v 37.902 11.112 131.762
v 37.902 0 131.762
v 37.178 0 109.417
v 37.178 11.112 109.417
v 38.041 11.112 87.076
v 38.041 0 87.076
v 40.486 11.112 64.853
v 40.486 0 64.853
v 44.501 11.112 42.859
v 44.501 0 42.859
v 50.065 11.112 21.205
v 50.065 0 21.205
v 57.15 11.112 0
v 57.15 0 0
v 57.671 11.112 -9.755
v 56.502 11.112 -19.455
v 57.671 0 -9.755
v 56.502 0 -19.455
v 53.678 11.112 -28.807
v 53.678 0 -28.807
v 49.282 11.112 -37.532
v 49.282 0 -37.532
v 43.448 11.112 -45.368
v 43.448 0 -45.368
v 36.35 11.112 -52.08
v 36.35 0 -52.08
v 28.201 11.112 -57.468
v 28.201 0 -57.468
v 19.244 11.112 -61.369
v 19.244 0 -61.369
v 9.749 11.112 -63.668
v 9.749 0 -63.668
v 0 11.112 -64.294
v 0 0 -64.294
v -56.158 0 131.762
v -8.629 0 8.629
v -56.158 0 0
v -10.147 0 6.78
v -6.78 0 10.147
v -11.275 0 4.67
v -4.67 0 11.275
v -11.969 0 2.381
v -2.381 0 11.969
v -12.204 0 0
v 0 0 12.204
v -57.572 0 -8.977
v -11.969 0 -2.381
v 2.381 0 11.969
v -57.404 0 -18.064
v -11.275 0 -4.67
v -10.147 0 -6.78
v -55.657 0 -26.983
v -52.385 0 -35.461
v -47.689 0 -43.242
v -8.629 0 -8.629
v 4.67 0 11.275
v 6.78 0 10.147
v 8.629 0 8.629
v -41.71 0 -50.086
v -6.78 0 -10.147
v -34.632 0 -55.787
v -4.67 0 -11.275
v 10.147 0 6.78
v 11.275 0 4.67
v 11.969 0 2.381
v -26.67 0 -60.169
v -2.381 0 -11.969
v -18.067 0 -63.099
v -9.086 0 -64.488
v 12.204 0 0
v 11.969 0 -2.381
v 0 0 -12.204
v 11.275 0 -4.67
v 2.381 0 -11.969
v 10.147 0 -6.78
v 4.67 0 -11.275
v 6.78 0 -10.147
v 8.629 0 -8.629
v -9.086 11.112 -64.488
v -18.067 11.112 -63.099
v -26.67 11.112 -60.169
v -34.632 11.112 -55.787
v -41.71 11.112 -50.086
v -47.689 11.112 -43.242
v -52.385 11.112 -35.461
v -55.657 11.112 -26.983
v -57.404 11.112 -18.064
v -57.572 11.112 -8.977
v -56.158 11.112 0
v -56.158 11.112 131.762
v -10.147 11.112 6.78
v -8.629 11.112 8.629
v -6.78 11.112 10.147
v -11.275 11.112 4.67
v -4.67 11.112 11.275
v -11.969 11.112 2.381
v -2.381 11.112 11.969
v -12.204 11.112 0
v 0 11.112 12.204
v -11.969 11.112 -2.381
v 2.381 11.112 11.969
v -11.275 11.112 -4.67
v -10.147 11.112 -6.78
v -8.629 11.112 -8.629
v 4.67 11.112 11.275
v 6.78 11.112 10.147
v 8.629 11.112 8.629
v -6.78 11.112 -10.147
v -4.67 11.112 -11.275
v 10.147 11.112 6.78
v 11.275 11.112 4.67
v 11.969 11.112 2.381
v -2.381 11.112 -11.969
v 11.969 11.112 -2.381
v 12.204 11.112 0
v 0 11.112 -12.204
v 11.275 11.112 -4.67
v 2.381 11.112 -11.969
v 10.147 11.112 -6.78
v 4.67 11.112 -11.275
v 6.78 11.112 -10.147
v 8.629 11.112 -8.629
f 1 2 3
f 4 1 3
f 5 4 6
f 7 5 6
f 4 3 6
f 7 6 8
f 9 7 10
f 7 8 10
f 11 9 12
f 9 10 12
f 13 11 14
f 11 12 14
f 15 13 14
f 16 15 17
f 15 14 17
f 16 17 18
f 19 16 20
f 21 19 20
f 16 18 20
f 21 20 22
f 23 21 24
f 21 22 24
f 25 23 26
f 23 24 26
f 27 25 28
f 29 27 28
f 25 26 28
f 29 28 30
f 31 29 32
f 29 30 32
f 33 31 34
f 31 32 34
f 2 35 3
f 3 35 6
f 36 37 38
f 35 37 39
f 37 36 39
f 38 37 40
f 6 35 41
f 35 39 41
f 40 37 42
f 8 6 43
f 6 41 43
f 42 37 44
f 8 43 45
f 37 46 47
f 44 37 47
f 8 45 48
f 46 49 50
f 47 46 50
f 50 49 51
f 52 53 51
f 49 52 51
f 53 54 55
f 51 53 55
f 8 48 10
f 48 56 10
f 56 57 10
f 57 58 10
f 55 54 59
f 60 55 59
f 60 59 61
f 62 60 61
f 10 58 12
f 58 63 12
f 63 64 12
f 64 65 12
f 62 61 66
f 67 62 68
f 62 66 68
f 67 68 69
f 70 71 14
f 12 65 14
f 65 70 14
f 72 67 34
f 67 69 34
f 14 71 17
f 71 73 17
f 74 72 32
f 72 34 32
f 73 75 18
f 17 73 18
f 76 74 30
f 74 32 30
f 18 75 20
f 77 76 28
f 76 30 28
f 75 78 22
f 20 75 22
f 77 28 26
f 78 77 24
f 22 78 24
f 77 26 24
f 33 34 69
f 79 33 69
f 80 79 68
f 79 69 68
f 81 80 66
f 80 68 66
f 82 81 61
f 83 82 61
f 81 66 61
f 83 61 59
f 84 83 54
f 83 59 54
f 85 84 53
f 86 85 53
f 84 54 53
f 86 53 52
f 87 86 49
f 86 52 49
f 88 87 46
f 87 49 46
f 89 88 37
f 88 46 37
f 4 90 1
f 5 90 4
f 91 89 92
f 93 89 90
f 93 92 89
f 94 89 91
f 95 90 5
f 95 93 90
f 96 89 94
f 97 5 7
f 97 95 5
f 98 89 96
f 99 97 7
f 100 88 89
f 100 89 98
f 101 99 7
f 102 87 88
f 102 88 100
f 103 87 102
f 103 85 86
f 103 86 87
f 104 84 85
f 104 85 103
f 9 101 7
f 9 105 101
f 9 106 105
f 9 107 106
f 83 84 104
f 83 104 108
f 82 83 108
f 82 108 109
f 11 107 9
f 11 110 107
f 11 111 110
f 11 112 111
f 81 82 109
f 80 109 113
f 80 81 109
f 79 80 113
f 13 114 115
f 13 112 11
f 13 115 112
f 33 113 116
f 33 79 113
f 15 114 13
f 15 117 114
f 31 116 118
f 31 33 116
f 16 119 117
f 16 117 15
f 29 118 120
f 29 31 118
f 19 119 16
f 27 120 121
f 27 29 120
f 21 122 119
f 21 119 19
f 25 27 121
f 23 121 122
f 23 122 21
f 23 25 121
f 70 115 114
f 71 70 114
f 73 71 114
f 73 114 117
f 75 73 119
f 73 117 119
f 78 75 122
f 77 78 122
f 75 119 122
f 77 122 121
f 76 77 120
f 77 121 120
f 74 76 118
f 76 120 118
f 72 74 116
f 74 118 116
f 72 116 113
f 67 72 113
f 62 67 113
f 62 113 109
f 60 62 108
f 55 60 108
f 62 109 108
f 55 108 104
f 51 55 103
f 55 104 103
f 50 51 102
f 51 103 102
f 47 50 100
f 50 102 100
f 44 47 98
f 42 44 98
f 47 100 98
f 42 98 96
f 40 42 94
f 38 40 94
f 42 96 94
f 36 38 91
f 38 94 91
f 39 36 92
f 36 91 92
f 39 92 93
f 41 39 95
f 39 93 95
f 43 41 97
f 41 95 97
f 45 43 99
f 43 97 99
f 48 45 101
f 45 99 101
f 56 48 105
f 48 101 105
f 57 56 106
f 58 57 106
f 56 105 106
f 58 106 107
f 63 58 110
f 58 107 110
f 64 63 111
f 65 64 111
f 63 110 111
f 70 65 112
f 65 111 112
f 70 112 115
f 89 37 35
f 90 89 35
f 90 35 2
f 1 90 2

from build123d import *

# Parameters (mm, degrees)
SKETCH1_R           = 7.9375
BOSS_EXTRUDE1_DEPTH = 11.1125
SKETCH2_R           = 12.20390625
CUT_EXTRUDE1_DEPTH  = 11.1125


with BuildPart() as part:
    # Sketch1 → Boss-Extrude1 (new body)
    with BuildSketch(Plane(origin=(0, 0, 0), x_dir=(1, 0, 0), z_dir=(0, 1, 0))):
        with BuildLine():
            Line((-56.1578125, 0), (-56.1578125, -131.7625))
            Line((-56.1578125, -131.7625), (37.9015625, -131.7625))
            ThreePointArc((37.9015625, -131.7625), (40.48606485, -64.852857695), (57.15, 0))
            ThreePointArc((57.15, 0), (43.44844613, 45.367716005), (0, 64.29375))
            ThreePointArc((0, 64.29375), (-44.848953518, 46.794786657), (-56.1578125, 0))
        make_face()
        Circle(SKETCH1_R, mode=Mode.SUBTRACT)
    extrude(amount=BOSS_EXTRUDE1_DEPTH)

    # Sketch2 → Cut-Extrude1 (cut)
    with BuildSketch(Plane(origin=(0, 11.1125, 0), x_dir=(1, 0, 0), z_dir=(0, 1, 0))):
        Circle(SKETCH2_R)
    extrude(amount=-CUT_EXTRUDE1_DEPTH, mode=Mode.SUBTRACT)


solid = part.part
